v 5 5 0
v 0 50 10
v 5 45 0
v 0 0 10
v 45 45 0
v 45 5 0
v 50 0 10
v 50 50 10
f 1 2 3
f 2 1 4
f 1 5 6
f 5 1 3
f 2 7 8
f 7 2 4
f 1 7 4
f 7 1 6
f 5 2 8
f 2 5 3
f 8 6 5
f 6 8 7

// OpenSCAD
module extrusion(length)
{
    translate([length,length,0])
    {
        linear_extrude(height=length,scale=2)
        {
            square(length,center=true);
        }
    }
}

extrusion(10);

hull()
{
    translate([0,0,0]){
        extrusion(10);
    }
    translate([30,0,0]){
        extrusion(10);
    }
    translate([30,30,0]){
        extrusion(10);
    }
    translate([0,30,0]){
        extrusion(10);
    }
}
